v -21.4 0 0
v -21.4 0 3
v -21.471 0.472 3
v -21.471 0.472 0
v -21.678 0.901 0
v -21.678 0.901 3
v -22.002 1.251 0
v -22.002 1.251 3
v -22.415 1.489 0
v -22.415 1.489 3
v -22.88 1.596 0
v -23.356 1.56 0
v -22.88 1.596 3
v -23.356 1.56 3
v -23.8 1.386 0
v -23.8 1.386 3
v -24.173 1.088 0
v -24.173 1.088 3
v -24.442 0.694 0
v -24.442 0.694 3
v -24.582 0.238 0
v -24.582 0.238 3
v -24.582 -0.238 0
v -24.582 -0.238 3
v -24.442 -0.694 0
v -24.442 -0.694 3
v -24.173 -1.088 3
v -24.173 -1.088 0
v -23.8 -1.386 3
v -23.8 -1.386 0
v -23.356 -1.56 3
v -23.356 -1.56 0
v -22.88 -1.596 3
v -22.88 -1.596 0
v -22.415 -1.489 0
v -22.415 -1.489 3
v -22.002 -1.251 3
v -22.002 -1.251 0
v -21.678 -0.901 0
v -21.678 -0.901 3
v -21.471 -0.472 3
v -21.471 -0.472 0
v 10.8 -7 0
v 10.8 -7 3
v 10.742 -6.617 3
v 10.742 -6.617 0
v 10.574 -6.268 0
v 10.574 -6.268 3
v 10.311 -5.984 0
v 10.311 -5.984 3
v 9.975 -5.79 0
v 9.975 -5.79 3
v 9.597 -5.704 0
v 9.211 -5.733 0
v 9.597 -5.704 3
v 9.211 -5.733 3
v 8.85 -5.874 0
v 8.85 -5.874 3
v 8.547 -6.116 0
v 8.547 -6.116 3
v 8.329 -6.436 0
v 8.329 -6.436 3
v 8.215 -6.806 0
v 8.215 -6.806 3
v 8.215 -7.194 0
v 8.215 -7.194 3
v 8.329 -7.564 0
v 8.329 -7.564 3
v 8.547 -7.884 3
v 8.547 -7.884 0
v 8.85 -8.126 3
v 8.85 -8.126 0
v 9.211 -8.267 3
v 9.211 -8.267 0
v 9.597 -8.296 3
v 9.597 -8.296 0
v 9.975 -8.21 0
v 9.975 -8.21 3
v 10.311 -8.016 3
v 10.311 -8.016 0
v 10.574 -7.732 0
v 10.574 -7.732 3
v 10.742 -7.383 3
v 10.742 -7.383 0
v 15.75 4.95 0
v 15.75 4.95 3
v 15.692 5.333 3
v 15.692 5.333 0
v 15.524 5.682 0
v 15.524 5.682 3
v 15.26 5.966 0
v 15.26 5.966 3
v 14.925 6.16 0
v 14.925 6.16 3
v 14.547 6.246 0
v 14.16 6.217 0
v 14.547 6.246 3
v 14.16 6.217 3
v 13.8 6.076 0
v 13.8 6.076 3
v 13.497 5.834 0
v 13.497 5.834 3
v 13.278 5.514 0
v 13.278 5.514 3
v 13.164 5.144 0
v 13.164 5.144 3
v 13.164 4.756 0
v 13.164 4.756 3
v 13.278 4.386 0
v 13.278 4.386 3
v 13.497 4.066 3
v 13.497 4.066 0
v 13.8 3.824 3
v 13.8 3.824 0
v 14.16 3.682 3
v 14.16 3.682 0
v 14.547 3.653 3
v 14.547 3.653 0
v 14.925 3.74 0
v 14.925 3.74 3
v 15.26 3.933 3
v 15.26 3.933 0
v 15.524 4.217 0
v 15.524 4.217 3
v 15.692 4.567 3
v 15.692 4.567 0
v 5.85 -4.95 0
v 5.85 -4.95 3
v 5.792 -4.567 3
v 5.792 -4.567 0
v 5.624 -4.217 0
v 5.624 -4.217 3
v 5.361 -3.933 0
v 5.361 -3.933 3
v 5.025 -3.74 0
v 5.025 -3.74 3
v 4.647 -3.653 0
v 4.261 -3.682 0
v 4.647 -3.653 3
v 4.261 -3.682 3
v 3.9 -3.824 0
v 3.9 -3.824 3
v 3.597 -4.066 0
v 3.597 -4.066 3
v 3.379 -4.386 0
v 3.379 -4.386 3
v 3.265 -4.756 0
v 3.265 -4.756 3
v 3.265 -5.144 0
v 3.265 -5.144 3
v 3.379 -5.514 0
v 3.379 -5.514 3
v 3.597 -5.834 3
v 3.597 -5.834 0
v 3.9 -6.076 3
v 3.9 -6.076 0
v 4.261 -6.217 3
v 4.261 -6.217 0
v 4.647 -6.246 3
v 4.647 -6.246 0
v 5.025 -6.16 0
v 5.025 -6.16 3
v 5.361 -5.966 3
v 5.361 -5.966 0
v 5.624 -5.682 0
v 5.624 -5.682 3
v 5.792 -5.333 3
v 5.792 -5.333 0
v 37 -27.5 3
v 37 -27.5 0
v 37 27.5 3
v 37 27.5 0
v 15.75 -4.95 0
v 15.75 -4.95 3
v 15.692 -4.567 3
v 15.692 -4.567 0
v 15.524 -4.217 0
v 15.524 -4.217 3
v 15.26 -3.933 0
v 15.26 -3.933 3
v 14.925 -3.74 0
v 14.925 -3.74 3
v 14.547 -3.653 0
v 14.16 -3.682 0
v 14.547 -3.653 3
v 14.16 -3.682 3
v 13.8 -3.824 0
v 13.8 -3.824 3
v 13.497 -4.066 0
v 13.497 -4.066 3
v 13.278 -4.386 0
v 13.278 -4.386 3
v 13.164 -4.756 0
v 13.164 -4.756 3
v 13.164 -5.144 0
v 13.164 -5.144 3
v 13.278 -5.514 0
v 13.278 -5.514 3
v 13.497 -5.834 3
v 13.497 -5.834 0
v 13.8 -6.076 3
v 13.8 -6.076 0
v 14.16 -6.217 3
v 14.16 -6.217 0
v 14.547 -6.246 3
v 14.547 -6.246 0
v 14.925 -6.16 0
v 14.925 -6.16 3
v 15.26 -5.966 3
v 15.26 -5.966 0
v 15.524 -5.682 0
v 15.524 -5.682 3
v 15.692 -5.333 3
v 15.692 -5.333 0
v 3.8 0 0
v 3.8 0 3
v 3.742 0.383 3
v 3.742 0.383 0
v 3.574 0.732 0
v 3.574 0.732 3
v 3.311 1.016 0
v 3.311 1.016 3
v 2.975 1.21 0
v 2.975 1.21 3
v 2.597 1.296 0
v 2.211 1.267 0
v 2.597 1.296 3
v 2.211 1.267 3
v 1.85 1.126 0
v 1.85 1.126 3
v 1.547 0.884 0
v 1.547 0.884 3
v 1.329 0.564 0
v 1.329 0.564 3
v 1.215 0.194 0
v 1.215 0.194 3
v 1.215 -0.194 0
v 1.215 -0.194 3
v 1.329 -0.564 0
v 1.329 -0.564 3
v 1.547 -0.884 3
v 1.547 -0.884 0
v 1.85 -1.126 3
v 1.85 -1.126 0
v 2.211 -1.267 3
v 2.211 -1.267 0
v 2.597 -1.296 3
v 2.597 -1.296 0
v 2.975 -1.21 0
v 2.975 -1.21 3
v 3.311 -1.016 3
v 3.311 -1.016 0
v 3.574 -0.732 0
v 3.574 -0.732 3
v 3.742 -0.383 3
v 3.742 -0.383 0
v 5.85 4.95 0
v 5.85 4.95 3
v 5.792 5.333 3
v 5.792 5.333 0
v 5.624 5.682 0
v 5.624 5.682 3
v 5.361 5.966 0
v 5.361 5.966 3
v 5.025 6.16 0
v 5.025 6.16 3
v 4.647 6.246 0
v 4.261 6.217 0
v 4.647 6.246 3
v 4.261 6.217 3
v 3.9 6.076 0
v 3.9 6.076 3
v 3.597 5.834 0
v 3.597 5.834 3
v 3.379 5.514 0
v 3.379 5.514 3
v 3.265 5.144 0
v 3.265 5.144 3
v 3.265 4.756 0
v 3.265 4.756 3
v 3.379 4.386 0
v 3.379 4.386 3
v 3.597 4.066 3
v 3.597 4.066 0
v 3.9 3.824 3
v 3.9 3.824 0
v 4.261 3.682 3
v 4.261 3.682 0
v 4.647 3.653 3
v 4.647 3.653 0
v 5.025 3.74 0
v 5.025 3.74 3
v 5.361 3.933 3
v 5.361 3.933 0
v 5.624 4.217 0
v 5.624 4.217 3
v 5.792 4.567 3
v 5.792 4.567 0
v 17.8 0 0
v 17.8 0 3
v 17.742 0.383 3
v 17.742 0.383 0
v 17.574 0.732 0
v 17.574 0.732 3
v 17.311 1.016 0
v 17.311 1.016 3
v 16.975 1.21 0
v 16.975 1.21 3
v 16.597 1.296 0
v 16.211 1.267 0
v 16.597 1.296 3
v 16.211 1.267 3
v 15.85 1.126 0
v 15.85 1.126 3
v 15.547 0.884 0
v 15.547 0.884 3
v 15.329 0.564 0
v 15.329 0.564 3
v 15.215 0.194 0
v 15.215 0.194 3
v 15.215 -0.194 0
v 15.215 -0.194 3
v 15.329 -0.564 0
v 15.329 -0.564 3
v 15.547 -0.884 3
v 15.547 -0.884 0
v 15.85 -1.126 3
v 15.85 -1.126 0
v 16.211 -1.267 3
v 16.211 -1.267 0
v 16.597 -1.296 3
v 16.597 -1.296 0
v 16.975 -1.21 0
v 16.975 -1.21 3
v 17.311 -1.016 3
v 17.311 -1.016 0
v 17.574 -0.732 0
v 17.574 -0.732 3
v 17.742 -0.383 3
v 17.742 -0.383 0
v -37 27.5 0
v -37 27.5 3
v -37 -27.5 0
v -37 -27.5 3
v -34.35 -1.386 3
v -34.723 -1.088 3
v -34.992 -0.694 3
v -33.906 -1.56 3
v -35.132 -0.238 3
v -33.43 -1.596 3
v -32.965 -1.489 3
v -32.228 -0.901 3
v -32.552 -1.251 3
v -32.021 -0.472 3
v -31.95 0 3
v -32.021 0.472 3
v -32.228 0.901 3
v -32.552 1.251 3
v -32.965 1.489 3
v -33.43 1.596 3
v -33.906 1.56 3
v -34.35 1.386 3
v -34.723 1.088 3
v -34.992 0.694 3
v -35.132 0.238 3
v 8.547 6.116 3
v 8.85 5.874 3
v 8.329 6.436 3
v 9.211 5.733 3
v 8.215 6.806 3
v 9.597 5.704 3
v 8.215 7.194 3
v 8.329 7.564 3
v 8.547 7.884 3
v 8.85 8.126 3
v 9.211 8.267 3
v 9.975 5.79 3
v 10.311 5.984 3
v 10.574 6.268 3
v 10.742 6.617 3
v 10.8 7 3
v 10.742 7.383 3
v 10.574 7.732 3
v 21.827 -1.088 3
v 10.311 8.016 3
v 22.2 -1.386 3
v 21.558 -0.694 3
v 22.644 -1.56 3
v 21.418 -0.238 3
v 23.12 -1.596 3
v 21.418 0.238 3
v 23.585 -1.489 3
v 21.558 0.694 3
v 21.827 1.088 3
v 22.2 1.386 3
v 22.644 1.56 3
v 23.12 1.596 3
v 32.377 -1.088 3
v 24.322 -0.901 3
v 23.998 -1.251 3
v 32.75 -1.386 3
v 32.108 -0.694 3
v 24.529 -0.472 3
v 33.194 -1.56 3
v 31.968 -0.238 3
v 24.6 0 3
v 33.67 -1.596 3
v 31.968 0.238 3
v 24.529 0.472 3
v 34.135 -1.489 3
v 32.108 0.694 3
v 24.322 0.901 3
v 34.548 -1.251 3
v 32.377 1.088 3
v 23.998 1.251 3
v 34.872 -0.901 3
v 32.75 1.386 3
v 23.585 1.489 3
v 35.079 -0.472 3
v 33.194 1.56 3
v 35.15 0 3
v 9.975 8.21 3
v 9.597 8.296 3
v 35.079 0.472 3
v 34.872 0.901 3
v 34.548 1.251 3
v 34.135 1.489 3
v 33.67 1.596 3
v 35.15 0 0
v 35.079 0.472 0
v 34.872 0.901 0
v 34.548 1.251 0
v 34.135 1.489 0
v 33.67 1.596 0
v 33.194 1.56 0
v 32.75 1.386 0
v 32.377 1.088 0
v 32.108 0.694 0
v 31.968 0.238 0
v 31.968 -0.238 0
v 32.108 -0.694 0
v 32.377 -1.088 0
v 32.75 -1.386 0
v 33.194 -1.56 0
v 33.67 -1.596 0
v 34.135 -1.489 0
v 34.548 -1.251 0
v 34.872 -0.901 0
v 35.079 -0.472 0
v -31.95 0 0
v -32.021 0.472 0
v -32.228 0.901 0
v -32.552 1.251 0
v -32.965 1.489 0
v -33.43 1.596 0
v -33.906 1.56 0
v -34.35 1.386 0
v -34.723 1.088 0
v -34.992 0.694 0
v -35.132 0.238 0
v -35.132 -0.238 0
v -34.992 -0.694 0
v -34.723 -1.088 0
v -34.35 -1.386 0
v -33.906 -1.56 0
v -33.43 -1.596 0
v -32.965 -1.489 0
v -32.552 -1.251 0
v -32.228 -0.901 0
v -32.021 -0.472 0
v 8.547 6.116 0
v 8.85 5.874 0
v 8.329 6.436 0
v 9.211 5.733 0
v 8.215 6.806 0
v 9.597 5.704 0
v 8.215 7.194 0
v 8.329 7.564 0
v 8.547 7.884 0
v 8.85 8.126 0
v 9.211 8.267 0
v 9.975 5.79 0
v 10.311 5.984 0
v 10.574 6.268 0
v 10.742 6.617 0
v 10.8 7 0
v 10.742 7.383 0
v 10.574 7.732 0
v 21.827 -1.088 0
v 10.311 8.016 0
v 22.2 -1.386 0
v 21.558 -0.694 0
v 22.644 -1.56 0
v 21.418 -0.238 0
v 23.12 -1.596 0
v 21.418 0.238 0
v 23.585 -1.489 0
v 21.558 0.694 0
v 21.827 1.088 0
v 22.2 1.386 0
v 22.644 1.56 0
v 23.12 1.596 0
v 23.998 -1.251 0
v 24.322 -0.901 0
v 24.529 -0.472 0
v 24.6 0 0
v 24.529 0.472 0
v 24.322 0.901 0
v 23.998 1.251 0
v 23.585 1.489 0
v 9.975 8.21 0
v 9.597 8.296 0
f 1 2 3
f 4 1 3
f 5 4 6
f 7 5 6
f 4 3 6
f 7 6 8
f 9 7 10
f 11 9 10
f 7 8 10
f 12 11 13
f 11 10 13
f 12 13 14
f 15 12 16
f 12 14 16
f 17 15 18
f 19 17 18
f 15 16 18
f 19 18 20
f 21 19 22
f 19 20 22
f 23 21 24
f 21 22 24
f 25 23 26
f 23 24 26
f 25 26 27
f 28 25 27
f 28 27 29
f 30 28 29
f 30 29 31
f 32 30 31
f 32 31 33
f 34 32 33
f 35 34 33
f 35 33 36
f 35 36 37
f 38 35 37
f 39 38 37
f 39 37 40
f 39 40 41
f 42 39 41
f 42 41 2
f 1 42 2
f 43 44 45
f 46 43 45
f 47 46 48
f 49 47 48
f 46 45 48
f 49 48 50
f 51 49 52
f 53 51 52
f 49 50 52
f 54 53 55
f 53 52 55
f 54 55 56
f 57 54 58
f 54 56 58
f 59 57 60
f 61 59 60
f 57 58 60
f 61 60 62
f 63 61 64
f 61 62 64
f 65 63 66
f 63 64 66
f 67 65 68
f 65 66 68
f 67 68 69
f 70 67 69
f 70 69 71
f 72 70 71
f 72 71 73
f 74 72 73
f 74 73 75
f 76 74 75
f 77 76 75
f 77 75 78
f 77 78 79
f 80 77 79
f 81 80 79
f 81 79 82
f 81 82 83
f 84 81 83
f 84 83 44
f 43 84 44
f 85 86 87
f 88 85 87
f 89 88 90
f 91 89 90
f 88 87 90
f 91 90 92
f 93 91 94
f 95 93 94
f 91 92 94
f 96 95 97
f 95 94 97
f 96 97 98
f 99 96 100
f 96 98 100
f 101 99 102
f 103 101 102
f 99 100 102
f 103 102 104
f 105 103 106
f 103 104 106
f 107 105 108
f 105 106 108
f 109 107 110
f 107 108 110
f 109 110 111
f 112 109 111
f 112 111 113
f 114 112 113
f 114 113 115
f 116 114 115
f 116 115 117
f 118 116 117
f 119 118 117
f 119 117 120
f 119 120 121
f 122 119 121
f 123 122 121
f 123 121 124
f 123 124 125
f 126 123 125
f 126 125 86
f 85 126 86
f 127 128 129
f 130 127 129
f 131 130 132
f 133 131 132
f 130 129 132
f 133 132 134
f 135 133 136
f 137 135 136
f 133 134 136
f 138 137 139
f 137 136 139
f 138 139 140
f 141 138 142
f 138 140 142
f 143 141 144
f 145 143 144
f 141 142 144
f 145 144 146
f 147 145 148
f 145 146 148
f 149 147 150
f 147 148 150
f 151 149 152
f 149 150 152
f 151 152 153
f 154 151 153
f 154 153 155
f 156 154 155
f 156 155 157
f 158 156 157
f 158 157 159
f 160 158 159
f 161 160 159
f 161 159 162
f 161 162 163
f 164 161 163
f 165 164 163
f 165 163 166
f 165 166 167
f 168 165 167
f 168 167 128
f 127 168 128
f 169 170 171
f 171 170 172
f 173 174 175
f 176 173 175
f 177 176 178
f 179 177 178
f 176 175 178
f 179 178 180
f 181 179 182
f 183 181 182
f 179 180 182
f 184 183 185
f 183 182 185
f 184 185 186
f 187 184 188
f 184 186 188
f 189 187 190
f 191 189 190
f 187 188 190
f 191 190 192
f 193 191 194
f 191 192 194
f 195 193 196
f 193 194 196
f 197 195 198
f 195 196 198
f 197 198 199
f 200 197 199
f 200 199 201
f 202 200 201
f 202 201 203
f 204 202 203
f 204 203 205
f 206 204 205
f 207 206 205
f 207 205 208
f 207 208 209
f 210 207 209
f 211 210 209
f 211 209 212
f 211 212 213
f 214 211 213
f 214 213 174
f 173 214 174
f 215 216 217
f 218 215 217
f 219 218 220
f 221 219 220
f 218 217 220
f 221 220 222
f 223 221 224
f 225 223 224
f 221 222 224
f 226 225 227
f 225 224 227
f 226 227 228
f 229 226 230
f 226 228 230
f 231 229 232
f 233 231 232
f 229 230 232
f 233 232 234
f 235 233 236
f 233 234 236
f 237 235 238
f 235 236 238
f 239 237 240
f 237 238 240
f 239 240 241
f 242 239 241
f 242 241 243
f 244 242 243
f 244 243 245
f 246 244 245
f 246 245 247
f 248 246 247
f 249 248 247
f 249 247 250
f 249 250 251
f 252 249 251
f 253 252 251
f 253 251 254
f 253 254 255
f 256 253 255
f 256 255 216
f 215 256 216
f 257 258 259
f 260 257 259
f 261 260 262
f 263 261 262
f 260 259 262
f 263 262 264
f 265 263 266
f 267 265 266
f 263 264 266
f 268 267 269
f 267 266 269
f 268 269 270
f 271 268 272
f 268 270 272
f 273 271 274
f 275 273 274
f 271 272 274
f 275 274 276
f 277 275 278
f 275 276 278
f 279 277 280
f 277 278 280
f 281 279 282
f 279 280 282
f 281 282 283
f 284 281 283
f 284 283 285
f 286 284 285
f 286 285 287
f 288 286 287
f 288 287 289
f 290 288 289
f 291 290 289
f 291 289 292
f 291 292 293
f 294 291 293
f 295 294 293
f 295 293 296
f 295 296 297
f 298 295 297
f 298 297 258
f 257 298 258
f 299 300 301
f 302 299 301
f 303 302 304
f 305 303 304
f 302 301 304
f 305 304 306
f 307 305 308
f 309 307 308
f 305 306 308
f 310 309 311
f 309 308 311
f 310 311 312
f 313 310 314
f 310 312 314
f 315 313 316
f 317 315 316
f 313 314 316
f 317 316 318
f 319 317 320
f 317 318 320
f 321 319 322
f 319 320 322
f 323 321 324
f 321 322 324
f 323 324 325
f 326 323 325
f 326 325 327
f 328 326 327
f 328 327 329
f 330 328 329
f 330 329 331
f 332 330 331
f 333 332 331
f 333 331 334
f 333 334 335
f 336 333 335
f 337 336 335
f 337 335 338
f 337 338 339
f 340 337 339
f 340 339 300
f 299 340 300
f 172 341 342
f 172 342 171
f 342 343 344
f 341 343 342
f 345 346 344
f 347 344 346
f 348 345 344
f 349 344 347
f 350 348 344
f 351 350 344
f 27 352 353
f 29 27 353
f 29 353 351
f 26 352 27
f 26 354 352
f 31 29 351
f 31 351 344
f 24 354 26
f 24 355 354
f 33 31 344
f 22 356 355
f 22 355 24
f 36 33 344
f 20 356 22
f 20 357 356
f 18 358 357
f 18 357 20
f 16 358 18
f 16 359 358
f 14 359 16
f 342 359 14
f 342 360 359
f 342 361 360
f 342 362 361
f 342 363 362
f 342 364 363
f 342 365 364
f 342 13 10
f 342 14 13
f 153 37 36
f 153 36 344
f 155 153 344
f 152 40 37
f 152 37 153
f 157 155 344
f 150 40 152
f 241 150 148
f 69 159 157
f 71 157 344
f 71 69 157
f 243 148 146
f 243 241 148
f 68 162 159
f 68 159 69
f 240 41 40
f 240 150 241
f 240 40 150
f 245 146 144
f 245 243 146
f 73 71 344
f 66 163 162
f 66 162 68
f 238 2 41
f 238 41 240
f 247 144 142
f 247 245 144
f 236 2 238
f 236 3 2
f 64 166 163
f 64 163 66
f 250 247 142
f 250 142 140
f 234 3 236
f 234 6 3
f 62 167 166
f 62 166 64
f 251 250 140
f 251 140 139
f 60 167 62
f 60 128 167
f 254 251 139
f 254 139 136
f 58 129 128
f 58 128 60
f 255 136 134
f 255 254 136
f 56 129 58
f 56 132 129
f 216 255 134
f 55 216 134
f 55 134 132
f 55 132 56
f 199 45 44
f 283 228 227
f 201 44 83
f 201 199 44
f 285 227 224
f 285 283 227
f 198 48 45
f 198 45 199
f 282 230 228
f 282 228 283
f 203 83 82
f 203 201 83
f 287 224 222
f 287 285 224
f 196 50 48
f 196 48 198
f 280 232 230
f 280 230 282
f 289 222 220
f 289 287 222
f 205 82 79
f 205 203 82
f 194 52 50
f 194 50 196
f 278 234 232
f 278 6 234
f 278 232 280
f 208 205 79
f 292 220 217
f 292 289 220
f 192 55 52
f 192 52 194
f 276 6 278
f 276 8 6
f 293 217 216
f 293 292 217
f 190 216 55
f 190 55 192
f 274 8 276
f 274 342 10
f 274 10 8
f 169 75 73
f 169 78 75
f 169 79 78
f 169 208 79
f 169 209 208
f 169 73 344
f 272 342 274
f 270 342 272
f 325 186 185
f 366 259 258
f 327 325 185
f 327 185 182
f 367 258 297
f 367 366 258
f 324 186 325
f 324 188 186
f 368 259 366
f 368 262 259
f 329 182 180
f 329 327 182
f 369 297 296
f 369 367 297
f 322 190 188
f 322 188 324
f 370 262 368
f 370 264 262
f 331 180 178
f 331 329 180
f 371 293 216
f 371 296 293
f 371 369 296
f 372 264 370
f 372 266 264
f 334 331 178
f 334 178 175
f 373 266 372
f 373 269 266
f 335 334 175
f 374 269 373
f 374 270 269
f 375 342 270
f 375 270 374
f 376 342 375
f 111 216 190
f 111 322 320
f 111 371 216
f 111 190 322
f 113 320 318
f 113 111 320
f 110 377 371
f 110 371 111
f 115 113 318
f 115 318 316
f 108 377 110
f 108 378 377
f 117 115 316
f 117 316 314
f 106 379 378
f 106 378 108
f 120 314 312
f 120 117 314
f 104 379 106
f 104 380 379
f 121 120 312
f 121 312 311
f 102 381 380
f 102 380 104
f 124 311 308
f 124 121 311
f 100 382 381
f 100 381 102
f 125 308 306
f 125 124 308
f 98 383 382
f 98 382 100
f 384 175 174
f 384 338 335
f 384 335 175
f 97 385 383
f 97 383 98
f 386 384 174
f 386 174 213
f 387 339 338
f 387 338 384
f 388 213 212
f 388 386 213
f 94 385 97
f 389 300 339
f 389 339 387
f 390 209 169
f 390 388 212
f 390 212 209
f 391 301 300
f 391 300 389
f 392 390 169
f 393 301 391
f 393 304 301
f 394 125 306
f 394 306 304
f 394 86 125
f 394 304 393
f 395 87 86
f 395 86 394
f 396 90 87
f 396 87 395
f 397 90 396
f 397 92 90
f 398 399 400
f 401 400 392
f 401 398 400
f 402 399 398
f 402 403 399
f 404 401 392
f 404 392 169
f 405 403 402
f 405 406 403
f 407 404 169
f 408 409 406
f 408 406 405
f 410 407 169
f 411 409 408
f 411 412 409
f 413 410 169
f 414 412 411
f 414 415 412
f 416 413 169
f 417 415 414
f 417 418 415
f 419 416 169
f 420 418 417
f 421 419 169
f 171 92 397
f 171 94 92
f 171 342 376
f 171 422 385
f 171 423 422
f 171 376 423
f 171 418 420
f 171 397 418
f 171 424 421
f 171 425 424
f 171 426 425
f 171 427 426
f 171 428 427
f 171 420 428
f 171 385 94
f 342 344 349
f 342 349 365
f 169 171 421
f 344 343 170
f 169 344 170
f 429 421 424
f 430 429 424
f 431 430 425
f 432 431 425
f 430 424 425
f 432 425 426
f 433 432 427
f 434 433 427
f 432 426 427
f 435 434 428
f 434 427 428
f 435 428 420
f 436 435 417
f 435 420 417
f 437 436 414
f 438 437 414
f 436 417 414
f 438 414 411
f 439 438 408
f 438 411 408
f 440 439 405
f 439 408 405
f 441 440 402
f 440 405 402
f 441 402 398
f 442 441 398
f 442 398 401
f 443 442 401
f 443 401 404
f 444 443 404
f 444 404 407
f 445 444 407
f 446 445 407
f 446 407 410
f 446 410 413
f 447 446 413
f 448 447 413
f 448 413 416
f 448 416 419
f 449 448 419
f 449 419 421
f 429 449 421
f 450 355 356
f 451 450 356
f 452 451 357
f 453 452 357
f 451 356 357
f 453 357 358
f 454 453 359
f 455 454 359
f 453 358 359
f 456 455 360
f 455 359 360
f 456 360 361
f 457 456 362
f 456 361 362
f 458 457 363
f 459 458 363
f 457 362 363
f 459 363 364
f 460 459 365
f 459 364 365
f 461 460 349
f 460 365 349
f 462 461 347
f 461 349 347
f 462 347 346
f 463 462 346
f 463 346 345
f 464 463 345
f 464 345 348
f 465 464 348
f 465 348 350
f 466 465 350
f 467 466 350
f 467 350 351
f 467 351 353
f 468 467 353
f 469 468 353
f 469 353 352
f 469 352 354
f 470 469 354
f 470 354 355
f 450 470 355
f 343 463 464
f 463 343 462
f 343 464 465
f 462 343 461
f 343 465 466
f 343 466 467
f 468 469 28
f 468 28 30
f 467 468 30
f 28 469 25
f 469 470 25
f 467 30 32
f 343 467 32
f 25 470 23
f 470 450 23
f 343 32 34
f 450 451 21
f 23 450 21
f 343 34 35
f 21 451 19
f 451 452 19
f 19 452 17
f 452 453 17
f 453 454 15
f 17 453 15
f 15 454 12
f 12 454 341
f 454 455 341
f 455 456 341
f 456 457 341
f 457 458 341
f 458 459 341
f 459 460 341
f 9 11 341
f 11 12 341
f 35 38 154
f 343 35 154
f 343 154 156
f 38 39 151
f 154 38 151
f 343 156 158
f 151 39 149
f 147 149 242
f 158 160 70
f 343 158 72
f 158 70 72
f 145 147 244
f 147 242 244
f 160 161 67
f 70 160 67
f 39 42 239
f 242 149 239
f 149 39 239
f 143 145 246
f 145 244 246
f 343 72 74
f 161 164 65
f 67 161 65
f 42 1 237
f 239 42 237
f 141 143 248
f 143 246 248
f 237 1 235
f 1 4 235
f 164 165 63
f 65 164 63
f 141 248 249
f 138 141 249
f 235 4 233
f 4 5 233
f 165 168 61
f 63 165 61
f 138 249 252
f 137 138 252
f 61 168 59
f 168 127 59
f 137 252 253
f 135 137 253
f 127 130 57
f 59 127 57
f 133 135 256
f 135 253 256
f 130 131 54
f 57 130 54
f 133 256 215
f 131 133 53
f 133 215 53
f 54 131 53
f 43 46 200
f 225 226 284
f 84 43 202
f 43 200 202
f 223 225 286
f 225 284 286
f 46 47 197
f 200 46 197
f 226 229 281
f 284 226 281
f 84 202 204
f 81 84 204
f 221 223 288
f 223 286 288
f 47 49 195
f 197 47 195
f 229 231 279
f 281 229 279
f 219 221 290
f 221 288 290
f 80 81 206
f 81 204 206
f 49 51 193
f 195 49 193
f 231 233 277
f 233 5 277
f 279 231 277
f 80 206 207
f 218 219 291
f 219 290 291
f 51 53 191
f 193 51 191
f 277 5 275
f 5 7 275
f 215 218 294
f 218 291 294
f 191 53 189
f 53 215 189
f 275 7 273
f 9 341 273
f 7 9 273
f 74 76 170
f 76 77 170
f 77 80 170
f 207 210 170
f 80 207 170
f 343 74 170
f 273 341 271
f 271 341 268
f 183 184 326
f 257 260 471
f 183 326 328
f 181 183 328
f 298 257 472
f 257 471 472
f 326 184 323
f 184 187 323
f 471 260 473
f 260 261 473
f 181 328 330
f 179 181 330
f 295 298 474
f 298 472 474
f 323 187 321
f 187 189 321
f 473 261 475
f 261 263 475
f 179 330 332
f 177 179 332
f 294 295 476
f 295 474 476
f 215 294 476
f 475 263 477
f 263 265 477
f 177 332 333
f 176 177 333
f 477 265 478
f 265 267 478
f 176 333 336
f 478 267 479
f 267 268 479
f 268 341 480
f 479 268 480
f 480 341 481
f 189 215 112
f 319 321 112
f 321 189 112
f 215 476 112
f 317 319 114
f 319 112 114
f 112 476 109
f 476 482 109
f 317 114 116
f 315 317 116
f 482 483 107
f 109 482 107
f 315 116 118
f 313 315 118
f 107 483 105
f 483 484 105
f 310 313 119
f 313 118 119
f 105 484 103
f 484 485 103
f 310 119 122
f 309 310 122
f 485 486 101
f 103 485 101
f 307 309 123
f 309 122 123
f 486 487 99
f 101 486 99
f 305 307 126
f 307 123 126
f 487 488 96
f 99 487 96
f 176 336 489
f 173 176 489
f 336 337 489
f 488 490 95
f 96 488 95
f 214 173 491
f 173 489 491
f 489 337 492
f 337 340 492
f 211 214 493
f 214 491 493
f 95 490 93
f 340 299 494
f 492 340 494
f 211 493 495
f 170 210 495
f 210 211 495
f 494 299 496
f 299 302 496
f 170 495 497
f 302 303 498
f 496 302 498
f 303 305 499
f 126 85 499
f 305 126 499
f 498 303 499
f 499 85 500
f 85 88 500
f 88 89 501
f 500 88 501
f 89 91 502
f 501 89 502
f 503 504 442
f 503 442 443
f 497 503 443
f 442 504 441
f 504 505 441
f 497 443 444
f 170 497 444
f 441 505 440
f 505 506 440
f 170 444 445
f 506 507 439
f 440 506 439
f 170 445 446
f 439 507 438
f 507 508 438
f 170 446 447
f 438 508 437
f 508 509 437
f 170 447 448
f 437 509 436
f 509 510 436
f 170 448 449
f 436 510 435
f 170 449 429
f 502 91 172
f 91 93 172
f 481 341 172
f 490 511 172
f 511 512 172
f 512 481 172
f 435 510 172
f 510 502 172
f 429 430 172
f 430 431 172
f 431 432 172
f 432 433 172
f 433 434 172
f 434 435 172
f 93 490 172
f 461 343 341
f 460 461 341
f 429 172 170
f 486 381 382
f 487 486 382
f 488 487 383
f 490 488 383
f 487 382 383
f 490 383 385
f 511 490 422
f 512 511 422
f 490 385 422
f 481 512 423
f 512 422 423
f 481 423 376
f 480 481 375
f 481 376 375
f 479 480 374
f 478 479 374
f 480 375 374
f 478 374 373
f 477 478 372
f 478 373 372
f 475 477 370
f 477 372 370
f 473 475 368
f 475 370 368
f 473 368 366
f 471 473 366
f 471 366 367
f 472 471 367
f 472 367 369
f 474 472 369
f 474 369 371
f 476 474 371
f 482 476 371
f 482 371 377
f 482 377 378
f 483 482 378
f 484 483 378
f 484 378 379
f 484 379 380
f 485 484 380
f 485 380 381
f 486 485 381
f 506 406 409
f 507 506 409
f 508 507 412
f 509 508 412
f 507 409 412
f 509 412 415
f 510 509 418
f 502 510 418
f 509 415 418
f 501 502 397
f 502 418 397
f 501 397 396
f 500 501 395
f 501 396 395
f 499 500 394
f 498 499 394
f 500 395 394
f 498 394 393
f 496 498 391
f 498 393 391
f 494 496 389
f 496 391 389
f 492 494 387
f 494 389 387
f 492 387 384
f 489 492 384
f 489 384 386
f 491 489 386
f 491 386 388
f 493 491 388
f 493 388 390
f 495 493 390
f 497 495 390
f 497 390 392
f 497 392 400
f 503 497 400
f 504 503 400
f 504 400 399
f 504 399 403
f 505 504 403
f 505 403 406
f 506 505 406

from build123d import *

# Parameters (mm, degrees)
SKETCH_1_W          = 74
SKETCH_1_H          = 55
EXTRUDE_1_DEPTH     = 3
SKETCH_2_R          = 1.6
CUT_EXTRUDE_1_DEPTH = 4
SKETCH_2_3_R        = 1.3
CUT_EXTRUDE_2_DEPTH = 4


with BuildPart() as part:
    # 草圖1 → 填料-伸長1 (new body)
    with BuildSketch(Plane.XY):
        Rectangle(SKETCH_1_W, SKETCH_1_H)
    extrude(amount=EXTRUDE_1_DEPTH)

    # 草圖2 → 除料-伸長1 (cut, through all)
    with BuildSketch(Plane.XY.offset(3)):
        with Locations((-33.55, 0)):
            Circle(SKETCH_2_R)
        with Locations((33.55, 0)):
            Circle(SKETCH_2_R)
        with Locations((-23, 0)):
            Circle(SKETCH_2_R)
        with Locations((23, 0)):
            Circle(SKETCH_2_R)
    extrude(amount=-CUT_EXTRUDE_1_DEPTH, mode=Mode.SUBTRACT)

    # 草圖2<3> → 除料-伸長2 (cut, through all)
    with BuildSketch(Plane.XY.offset(3)):
        with Locations((16.5, 0)):
            Circle(SKETCH_2_3_R)
        with Locations((14.449747468, -4.949747468)):
            Circle(SKETCH_2_3_R)
        with Locations((9.5, -7)):
            Circle(SKETCH_2_3_R)
        with Locations((4.550252532, -4.949747468)):
            Circle(SKETCH_2_3_R)
        with Locations((2.5, 0)):
            Circle(SKETCH_2_3_R)
        with Locations((4.550252532, 4.949747468)):
            Circle(SKETCH_2_3_R)
        with Locations((9.5, 7)):
            Circle(SKETCH_2_3_R)
        with Locations((14.449747468, 4.949747468)):
            Circle(SKETCH_2_3_R)
    extrude(amount=-CUT_EXTRUDE_2_DEPTH, mode=Mode.SUBTRACT)


solid = part.part
